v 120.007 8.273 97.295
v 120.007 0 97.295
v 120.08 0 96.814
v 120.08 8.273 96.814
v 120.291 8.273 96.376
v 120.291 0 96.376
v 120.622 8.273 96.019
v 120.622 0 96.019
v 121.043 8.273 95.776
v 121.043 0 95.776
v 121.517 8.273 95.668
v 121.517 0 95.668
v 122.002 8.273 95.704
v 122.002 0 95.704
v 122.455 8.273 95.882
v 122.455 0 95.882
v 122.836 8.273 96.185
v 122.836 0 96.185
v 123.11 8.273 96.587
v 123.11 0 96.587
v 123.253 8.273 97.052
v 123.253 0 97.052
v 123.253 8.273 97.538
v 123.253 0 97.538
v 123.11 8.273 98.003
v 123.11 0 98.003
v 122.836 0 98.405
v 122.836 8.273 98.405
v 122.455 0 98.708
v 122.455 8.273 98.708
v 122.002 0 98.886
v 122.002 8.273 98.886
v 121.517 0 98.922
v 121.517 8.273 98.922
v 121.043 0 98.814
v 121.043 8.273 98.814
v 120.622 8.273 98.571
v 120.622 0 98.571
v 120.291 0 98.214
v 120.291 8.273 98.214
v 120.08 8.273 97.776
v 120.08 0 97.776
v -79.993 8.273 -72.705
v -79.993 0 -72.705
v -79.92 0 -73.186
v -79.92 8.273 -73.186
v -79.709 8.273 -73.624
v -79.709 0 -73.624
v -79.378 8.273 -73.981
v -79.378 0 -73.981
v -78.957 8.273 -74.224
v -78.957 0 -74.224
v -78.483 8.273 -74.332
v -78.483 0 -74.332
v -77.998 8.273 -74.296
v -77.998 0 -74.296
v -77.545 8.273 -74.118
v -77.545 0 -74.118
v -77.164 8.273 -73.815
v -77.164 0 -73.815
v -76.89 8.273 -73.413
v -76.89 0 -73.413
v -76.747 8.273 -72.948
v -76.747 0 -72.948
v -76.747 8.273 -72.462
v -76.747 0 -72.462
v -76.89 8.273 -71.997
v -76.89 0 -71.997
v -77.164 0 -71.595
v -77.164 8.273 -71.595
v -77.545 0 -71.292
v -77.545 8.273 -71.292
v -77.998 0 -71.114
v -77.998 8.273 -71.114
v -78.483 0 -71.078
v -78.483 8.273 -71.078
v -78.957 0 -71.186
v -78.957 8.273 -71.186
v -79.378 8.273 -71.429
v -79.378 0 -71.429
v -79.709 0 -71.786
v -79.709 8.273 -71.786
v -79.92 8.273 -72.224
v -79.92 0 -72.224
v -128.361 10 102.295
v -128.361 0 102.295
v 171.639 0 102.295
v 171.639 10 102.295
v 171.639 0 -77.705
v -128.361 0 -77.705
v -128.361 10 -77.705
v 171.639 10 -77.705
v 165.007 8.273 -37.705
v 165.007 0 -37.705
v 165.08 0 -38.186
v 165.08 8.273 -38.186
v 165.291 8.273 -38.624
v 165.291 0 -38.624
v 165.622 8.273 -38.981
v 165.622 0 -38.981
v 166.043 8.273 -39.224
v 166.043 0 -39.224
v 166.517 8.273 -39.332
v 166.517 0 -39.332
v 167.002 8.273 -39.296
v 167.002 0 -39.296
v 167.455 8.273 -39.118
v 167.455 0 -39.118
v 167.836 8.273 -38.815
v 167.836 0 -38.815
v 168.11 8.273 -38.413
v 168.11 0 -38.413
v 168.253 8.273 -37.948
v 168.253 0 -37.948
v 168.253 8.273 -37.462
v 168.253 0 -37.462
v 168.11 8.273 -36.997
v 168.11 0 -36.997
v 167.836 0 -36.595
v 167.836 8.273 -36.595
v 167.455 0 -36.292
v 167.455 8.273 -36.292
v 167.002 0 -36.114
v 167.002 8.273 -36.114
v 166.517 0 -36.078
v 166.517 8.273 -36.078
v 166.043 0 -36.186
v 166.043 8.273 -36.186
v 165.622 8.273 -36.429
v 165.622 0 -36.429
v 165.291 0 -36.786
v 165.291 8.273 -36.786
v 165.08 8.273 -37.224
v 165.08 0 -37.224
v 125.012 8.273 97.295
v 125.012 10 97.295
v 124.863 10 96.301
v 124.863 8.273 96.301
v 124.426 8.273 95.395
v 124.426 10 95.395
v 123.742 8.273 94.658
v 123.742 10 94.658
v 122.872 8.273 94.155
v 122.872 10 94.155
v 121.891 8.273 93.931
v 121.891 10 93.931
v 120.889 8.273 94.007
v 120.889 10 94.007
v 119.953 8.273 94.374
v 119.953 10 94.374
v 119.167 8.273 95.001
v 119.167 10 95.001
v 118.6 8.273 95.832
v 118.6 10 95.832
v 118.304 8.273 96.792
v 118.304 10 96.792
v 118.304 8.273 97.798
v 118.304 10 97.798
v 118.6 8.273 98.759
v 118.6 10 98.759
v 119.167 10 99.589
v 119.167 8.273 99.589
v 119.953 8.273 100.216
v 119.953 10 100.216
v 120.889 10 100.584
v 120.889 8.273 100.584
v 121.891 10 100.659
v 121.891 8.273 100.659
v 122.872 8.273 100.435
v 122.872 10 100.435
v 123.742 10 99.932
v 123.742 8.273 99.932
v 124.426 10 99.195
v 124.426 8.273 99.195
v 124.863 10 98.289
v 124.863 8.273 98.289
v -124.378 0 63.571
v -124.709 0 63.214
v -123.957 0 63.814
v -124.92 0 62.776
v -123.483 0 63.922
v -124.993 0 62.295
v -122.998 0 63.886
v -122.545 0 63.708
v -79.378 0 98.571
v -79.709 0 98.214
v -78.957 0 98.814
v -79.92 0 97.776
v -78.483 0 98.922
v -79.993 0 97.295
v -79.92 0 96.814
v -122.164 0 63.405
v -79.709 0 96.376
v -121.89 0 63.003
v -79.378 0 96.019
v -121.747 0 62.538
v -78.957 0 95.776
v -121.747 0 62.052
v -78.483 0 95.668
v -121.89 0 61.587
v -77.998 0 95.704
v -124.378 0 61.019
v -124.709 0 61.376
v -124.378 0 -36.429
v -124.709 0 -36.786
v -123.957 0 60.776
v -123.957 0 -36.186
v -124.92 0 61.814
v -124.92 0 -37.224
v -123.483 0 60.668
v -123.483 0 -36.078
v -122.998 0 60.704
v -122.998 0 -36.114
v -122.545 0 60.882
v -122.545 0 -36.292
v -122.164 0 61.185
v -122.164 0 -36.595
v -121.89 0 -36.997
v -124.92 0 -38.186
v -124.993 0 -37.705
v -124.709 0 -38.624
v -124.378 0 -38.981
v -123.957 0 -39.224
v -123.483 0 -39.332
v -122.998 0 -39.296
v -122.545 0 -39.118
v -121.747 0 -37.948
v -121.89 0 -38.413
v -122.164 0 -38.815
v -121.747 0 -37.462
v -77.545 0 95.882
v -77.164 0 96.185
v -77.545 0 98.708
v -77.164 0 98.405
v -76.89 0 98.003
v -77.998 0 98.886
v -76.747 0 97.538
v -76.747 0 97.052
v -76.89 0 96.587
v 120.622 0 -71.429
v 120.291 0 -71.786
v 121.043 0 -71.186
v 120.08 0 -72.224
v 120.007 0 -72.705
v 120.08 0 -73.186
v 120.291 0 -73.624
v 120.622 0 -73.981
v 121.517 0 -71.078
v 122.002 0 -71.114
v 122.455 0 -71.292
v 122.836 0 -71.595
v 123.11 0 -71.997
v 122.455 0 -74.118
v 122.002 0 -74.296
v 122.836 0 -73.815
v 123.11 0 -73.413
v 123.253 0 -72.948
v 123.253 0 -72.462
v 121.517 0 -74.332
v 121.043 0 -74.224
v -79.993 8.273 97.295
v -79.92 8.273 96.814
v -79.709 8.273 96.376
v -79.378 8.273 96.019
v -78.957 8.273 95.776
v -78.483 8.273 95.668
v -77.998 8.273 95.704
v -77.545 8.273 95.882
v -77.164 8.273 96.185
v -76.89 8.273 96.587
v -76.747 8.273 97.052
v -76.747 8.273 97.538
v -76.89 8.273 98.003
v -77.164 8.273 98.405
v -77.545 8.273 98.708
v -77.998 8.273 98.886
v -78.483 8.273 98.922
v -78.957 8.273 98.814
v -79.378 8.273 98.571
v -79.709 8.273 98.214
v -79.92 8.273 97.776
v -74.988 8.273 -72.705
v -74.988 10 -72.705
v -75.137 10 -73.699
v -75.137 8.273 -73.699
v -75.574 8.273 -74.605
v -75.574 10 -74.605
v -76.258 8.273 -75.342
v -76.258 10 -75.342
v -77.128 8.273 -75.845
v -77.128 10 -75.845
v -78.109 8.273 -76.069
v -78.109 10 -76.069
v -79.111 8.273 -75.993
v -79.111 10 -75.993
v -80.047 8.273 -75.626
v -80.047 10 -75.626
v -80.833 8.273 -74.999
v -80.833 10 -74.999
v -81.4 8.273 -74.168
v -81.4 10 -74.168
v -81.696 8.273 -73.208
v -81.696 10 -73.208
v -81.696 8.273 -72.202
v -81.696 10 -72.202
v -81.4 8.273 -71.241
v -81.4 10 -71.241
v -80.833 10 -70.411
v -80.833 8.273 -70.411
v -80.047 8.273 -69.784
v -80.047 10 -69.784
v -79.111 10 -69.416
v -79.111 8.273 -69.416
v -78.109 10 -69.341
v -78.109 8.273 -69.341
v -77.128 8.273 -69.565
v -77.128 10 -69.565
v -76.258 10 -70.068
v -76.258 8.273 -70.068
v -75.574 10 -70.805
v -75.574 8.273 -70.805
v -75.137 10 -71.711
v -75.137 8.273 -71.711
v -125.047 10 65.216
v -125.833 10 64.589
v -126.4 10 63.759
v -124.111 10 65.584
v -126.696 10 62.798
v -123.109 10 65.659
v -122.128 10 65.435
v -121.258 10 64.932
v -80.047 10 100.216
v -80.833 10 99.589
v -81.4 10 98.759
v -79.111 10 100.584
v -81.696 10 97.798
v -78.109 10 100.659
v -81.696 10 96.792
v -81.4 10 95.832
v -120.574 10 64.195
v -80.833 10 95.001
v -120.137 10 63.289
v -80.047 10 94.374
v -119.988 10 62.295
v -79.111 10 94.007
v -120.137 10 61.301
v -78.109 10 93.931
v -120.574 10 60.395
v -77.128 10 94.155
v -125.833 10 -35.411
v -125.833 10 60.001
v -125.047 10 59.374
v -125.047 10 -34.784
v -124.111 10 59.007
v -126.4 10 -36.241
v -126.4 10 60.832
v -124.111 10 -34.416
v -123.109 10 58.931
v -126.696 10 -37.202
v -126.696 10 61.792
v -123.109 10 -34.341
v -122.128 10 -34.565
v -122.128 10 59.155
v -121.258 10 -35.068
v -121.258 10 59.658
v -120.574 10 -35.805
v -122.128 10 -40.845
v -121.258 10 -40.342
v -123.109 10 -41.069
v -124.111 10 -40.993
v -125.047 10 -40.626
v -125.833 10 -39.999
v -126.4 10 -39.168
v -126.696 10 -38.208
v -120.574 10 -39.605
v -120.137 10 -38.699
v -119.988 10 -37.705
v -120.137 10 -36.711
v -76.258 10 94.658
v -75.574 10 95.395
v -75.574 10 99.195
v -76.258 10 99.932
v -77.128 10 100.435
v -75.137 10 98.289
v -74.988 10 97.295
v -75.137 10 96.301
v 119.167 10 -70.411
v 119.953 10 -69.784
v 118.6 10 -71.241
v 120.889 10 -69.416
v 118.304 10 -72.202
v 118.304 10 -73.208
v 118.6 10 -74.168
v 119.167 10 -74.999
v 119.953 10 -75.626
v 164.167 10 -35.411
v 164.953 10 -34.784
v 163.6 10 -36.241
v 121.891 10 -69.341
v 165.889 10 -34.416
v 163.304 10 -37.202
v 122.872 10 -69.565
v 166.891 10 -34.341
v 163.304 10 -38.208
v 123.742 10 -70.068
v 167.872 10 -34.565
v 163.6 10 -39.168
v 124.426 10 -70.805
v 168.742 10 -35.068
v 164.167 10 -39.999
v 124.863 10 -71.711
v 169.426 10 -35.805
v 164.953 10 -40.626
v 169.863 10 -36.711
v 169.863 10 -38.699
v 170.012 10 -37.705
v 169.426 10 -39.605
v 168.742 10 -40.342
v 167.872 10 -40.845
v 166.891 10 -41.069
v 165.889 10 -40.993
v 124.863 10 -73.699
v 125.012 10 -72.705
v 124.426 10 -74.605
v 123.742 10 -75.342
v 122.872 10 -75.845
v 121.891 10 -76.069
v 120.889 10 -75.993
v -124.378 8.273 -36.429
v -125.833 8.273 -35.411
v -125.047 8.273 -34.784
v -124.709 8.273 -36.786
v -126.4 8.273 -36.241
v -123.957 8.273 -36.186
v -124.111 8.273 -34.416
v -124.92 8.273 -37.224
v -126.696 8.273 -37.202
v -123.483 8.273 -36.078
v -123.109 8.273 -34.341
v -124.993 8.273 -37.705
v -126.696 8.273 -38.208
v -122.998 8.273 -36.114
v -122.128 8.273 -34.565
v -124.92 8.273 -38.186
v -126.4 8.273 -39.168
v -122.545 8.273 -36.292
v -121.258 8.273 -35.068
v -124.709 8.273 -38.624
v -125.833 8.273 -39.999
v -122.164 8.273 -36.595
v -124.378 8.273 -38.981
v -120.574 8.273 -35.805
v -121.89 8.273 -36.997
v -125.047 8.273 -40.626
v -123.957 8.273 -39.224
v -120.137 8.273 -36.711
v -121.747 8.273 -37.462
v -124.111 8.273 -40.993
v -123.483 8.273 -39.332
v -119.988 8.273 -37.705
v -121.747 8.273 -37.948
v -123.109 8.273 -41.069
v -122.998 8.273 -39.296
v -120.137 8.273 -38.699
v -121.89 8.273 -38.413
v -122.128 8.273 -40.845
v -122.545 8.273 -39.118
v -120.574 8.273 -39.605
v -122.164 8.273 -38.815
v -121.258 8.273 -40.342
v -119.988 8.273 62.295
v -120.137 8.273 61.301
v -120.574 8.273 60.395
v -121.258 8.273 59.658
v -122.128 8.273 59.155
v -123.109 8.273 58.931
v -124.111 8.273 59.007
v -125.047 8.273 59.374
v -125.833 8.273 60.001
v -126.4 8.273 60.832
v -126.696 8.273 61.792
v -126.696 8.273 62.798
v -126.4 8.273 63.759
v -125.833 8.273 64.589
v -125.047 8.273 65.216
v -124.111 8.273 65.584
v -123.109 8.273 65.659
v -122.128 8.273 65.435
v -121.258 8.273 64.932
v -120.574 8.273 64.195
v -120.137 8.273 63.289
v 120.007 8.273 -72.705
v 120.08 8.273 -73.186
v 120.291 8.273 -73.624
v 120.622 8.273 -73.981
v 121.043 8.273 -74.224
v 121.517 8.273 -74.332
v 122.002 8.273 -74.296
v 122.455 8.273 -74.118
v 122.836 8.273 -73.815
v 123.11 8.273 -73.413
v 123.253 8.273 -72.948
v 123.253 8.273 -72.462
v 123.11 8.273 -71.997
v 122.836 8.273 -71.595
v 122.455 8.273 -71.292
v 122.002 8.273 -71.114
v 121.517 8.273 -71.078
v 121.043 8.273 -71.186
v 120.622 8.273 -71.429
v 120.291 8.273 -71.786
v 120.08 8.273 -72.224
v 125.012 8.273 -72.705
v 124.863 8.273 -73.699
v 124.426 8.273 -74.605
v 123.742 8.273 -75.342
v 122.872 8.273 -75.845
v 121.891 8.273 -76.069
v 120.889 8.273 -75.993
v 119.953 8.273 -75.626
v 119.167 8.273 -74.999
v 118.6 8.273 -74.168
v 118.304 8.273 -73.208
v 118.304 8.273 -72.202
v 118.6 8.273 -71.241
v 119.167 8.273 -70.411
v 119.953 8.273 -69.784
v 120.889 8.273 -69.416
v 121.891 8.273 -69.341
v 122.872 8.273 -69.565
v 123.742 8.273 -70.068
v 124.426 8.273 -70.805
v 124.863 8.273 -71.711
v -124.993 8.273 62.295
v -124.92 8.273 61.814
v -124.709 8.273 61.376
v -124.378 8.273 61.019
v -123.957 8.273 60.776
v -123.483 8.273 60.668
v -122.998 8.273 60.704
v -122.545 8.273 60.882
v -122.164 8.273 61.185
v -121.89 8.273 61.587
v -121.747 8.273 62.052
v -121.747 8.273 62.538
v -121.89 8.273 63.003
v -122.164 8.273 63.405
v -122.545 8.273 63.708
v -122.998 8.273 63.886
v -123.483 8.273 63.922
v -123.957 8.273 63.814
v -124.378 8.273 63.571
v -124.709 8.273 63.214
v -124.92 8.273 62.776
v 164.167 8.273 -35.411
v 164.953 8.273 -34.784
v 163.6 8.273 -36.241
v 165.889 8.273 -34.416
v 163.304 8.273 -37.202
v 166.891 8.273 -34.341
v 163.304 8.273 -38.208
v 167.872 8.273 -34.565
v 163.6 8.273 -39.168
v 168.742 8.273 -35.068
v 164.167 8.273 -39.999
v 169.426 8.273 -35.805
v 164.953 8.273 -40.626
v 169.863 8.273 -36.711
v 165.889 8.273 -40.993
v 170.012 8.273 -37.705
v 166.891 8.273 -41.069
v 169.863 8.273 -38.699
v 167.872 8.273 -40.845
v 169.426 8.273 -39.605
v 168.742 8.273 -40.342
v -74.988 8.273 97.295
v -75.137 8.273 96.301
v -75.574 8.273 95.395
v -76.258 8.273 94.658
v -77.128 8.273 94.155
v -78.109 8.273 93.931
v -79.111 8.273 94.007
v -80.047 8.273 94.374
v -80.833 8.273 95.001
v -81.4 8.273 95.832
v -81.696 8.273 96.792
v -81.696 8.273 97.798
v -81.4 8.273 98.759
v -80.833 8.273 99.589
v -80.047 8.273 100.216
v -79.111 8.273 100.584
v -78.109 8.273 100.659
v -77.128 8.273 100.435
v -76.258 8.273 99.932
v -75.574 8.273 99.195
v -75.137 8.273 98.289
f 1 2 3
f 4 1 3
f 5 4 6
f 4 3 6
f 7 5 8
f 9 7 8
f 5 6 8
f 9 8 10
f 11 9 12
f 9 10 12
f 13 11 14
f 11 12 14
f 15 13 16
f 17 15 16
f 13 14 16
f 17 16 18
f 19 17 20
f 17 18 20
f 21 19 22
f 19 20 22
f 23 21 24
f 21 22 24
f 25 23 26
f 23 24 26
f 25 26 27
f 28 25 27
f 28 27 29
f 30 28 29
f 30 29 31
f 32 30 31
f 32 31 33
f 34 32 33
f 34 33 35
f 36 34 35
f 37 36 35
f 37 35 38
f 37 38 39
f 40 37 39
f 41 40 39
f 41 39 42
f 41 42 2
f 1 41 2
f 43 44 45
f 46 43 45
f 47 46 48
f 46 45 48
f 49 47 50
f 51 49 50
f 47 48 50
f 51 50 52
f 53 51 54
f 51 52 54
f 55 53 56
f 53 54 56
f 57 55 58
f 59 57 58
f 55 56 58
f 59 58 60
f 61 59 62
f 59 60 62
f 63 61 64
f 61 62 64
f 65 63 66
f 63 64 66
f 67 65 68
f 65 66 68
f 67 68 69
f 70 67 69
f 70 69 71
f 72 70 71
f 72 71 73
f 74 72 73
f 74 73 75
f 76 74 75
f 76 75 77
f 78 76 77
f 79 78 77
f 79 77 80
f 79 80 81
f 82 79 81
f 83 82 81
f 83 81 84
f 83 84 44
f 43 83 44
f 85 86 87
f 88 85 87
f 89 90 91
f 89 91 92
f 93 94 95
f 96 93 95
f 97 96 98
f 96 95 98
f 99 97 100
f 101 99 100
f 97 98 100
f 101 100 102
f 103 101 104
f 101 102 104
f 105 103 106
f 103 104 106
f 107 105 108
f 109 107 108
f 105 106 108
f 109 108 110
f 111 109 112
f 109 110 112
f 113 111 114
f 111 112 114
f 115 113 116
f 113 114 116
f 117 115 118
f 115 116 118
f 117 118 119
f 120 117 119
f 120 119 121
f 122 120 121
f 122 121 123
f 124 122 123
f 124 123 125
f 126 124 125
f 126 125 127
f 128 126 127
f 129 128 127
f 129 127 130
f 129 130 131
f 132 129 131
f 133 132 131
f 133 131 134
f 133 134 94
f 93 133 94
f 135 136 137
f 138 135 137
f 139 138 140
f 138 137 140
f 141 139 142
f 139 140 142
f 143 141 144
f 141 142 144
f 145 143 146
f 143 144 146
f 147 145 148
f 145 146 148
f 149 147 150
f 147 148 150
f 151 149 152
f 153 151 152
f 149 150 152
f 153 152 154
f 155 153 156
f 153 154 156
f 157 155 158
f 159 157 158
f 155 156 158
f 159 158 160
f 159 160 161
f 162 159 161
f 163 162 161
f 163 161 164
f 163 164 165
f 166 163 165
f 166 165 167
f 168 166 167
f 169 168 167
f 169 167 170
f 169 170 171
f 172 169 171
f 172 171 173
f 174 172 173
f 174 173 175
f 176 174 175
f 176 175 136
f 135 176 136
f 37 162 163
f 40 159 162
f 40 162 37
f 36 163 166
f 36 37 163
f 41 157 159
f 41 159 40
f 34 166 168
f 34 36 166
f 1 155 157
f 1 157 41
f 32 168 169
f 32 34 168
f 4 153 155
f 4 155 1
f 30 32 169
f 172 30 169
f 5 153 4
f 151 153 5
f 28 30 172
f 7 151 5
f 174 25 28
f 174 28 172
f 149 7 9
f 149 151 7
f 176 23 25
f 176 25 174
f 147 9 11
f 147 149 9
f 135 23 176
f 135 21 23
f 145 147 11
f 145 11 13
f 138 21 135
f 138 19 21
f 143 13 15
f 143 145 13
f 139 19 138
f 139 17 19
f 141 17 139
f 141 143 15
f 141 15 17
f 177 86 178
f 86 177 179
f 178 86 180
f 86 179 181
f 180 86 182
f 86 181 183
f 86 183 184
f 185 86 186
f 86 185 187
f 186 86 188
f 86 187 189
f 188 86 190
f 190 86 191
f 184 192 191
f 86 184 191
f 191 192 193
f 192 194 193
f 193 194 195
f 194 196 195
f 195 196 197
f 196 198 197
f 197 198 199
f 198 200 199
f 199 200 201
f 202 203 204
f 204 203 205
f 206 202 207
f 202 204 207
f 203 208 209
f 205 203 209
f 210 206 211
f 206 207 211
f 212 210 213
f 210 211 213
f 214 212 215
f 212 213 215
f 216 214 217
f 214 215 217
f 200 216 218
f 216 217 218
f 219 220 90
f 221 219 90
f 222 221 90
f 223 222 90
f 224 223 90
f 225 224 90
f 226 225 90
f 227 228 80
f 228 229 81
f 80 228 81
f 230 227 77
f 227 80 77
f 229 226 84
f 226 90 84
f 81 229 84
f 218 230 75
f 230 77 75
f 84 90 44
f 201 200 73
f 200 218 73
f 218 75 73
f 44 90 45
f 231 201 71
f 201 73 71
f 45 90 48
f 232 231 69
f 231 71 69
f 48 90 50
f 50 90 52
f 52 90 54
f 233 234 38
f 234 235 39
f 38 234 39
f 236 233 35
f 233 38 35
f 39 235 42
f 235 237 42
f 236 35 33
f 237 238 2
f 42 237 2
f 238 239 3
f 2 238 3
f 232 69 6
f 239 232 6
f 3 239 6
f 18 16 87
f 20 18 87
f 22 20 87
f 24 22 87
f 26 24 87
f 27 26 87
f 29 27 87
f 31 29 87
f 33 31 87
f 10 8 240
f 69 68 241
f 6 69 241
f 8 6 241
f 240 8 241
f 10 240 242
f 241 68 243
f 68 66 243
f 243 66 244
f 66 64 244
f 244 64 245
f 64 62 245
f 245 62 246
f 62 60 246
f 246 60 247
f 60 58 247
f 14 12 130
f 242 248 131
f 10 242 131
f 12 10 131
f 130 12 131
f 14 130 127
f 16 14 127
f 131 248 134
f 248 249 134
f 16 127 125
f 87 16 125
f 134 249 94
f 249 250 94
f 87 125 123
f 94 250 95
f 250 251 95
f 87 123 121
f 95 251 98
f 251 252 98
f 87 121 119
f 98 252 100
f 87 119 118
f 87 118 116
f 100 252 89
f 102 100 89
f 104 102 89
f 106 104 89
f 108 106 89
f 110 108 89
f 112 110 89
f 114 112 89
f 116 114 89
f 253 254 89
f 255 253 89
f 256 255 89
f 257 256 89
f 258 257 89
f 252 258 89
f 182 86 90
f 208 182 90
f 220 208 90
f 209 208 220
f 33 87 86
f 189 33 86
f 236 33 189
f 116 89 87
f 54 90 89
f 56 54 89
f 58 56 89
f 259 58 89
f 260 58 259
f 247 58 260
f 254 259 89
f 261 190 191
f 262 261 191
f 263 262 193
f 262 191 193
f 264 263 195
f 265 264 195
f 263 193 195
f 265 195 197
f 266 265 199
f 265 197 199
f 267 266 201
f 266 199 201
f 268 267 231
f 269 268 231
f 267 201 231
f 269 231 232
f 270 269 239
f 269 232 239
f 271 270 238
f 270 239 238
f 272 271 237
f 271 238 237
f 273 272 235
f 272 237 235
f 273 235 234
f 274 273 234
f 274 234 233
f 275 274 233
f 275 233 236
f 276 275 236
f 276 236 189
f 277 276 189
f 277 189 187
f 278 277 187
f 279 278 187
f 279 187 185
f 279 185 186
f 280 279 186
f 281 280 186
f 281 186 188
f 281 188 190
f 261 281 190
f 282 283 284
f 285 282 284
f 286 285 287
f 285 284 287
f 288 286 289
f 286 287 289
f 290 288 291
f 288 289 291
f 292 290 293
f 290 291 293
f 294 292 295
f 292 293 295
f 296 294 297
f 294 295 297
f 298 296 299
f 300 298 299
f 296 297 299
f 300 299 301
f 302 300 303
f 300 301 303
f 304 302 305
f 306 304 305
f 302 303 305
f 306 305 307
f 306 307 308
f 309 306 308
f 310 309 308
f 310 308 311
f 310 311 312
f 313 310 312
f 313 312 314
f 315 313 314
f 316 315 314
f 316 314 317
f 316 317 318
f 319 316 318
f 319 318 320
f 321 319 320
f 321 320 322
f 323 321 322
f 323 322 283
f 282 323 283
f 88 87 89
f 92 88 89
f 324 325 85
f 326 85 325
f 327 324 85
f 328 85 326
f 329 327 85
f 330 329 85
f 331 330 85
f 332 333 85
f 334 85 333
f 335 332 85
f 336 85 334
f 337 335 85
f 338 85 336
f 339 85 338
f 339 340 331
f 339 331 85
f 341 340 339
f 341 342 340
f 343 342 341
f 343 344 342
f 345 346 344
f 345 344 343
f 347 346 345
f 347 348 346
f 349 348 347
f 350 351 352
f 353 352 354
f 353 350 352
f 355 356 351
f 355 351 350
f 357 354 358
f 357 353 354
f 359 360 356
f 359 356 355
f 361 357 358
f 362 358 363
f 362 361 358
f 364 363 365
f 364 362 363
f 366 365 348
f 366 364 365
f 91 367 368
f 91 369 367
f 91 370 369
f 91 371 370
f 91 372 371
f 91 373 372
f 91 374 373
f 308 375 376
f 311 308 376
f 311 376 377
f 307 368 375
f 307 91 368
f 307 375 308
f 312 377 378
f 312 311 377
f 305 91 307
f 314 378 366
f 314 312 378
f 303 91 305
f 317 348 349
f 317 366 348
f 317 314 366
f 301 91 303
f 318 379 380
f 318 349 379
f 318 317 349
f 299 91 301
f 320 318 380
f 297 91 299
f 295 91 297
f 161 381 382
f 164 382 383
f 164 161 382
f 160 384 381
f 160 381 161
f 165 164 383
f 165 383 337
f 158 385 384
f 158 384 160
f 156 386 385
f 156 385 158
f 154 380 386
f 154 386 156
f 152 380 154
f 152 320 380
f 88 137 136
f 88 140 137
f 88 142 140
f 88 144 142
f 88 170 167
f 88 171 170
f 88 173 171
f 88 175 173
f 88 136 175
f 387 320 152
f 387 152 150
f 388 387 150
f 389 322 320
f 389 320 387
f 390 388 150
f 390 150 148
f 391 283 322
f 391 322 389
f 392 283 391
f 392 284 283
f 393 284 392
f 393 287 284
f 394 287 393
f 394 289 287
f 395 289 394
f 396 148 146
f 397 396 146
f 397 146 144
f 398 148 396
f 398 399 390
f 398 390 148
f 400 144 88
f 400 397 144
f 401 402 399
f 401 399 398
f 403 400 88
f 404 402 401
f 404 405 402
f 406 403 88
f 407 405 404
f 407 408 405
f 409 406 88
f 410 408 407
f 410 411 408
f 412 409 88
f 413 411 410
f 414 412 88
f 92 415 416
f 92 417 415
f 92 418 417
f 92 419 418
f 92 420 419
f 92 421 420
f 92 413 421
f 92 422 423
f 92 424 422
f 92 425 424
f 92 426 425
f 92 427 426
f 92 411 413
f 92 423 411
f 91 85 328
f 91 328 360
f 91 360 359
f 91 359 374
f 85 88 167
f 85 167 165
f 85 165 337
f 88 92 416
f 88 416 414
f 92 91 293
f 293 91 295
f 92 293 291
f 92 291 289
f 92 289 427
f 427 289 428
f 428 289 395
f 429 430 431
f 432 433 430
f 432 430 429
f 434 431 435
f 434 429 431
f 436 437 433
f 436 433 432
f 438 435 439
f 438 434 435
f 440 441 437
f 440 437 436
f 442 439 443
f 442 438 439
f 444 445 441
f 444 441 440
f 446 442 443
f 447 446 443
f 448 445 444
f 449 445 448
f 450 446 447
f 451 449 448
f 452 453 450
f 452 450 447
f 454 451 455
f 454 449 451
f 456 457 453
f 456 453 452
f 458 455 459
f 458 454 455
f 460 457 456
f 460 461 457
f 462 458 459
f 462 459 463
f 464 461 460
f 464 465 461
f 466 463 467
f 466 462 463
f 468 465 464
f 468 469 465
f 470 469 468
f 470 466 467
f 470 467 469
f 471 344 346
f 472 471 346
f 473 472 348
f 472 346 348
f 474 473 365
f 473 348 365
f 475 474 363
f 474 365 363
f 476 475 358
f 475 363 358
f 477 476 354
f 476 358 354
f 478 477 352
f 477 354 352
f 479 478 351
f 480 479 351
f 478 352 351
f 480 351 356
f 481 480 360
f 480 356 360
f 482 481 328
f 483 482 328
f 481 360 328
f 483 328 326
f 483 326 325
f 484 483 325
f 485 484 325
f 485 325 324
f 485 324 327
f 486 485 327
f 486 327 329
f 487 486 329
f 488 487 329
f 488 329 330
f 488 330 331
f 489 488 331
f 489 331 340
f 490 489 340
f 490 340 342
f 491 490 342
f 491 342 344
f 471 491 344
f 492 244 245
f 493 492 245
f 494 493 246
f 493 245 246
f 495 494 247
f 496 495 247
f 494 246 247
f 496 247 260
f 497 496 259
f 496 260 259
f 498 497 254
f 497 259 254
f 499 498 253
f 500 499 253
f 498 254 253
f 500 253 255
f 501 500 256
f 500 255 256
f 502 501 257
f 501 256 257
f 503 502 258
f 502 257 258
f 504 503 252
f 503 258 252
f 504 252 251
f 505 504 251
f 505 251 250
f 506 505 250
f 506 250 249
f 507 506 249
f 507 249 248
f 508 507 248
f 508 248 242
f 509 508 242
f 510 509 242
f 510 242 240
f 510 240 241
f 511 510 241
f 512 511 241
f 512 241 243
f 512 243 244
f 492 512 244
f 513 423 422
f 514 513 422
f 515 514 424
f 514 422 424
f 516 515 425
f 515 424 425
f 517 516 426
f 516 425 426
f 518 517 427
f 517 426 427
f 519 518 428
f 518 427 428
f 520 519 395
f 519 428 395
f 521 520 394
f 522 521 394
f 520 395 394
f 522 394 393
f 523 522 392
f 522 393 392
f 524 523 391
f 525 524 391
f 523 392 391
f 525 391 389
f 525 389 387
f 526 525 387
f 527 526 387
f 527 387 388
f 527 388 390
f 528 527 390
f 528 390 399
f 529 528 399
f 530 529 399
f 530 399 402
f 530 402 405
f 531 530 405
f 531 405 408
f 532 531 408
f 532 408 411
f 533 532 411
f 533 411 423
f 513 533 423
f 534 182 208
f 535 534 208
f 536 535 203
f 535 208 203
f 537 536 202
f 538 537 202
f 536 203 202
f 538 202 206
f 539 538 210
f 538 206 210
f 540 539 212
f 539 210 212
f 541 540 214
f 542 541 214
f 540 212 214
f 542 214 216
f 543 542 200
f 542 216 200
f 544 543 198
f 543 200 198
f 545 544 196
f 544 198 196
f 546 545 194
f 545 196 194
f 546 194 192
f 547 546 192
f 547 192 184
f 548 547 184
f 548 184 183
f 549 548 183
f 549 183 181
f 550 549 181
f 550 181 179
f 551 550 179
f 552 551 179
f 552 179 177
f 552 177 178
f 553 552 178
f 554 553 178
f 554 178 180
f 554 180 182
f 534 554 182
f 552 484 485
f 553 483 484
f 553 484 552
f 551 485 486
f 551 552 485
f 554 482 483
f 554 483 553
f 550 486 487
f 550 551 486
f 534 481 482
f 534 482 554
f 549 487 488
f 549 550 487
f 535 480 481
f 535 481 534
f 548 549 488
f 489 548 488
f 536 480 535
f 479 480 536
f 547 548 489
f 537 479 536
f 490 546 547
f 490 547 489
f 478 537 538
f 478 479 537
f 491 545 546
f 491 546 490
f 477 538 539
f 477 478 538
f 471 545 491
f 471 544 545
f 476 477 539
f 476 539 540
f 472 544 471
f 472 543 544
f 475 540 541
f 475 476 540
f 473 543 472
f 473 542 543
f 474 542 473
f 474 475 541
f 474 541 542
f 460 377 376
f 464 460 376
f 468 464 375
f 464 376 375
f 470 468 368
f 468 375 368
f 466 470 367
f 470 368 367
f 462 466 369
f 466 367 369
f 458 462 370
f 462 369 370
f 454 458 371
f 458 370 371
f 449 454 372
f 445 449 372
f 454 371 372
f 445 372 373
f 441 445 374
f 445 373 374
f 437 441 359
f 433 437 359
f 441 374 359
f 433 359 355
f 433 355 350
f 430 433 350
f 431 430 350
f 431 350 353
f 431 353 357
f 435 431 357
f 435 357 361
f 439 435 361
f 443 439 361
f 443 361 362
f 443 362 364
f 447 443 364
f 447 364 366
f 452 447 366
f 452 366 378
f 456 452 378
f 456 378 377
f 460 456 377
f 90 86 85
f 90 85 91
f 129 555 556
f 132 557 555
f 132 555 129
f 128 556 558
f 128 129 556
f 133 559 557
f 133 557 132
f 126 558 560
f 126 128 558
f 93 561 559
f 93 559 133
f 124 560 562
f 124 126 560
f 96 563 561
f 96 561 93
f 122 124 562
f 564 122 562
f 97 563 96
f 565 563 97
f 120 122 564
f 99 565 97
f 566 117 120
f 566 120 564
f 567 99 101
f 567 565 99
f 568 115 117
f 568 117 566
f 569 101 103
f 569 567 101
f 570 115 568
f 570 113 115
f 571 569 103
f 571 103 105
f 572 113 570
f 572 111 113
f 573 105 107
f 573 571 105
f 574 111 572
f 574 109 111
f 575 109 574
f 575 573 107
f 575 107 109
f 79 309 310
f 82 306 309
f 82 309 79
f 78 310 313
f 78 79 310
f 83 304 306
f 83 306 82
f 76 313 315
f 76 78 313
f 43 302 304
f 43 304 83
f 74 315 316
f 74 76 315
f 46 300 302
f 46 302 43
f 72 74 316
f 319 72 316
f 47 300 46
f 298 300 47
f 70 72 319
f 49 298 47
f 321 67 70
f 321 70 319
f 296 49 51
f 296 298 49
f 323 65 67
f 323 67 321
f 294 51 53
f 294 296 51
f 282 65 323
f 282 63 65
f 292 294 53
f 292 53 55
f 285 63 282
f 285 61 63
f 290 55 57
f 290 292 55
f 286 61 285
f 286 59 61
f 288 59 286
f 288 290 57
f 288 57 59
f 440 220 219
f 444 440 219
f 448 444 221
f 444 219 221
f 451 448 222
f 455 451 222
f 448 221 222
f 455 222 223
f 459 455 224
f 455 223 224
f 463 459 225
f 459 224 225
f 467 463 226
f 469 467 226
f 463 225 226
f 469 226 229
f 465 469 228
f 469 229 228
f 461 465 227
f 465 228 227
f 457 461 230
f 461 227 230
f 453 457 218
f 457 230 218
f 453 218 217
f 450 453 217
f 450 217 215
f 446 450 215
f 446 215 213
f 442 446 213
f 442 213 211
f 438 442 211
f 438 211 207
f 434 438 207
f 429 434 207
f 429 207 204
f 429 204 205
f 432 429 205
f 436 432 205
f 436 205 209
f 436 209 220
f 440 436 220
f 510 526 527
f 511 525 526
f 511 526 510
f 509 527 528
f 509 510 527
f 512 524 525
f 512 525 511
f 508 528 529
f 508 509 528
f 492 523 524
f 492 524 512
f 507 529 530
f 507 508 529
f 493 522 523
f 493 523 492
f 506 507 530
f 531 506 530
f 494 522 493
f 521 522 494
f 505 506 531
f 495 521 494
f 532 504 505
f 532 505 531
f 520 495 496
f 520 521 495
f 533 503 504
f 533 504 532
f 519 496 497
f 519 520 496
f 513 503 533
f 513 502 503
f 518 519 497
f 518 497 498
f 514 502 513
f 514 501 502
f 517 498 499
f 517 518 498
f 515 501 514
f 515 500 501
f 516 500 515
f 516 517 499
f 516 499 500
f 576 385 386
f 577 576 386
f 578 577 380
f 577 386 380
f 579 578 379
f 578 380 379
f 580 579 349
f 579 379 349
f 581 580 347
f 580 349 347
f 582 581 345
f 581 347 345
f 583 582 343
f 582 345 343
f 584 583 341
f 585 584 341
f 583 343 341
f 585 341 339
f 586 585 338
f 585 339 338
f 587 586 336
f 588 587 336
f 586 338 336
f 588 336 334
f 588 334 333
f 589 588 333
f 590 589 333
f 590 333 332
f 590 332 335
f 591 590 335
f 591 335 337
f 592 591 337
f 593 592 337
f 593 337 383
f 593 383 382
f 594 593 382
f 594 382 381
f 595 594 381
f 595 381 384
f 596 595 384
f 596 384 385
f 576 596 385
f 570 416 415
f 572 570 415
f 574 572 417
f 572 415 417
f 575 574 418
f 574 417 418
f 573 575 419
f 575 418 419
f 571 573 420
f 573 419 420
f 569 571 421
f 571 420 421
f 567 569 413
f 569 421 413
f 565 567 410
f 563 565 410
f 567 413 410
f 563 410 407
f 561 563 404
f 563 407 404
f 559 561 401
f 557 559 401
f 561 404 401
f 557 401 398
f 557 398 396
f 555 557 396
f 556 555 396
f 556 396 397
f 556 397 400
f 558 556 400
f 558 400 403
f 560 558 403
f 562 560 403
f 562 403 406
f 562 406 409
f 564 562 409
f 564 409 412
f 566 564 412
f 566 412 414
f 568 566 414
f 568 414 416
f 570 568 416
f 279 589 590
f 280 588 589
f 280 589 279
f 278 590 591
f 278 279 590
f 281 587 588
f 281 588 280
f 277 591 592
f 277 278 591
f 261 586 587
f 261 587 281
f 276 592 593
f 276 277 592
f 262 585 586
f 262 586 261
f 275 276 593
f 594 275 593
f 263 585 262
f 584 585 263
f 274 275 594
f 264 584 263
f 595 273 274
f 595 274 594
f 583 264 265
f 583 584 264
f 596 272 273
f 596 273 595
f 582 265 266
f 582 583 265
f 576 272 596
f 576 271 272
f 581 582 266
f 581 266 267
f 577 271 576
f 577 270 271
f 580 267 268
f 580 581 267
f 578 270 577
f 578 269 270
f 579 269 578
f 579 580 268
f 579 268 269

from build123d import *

# Parameters (mm, degrees)
SKETCH1_W                                           = 300
SKETCH1_H                                           = 180
BOSS_EXTRUDE1_DEPTH                                 = 10
CBORE_FOR_4_BINDING_HEAD_MACHINE_SCREW1_D           = 3.2639
CBORE_FOR_4_BINDING_HEAD_MACHINE_SCREW1_DEPTH       = 10
CBORE_FOR_4_BINDING_HEAD_MACHINE_SCREW1_CBORE_D     = 6.74624
CBORE_FOR_4_BINDING_HEAD_MACHINE_SCREW1_CBORE_DEPTH = 1.7272


with BuildPart() as part:
    # Sketch1 → Boss-Extrude1 (new body)
    with BuildSketch(Plane(origin=(0, 0, 0), x_dir=(1, 0, 0), z_dir=(0, 1, 0))):
        with Locations((21.639344262, -12.295081967)):
            Rectangle(SKETCH1_W, SKETCH1_H)
    extrude(amount=BOSS_EXTRUDE1_DEPTH)

    # CBORE for #4 Binding Head Machine Screw1
    with Locations(Plane(origin=(0, 10, 0), x_dir=(1, 0, 0), z_dir=(0, 1, 0))):
        with Locations((-123.360655738, 37.704918033), (-123.360655738, -62.295081967), (-78.360655738, -97.295081967), (121.639344262, -97.295081967), (121.639344262, 72.704918033), (166.639344262, 37.704918033), (-78.360655738, 72.704918033)):
            CounterBoreHole(CBORE_FOR_4_BINDING_HEAD_MACHINE_SCREW1_D / 2, CBORE_FOR_4_BINDING_HEAD_MACHINE_SCREW1_CBORE_D / 2, CBORE_FOR_4_BINDING_HEAD_MACHINE_SCREW1_CBORE_DEPTH, depth=CBORE_FOR_4_BINDING_HEAD_MACHINE_SCREW1_DEPTH)


solid = part.part
